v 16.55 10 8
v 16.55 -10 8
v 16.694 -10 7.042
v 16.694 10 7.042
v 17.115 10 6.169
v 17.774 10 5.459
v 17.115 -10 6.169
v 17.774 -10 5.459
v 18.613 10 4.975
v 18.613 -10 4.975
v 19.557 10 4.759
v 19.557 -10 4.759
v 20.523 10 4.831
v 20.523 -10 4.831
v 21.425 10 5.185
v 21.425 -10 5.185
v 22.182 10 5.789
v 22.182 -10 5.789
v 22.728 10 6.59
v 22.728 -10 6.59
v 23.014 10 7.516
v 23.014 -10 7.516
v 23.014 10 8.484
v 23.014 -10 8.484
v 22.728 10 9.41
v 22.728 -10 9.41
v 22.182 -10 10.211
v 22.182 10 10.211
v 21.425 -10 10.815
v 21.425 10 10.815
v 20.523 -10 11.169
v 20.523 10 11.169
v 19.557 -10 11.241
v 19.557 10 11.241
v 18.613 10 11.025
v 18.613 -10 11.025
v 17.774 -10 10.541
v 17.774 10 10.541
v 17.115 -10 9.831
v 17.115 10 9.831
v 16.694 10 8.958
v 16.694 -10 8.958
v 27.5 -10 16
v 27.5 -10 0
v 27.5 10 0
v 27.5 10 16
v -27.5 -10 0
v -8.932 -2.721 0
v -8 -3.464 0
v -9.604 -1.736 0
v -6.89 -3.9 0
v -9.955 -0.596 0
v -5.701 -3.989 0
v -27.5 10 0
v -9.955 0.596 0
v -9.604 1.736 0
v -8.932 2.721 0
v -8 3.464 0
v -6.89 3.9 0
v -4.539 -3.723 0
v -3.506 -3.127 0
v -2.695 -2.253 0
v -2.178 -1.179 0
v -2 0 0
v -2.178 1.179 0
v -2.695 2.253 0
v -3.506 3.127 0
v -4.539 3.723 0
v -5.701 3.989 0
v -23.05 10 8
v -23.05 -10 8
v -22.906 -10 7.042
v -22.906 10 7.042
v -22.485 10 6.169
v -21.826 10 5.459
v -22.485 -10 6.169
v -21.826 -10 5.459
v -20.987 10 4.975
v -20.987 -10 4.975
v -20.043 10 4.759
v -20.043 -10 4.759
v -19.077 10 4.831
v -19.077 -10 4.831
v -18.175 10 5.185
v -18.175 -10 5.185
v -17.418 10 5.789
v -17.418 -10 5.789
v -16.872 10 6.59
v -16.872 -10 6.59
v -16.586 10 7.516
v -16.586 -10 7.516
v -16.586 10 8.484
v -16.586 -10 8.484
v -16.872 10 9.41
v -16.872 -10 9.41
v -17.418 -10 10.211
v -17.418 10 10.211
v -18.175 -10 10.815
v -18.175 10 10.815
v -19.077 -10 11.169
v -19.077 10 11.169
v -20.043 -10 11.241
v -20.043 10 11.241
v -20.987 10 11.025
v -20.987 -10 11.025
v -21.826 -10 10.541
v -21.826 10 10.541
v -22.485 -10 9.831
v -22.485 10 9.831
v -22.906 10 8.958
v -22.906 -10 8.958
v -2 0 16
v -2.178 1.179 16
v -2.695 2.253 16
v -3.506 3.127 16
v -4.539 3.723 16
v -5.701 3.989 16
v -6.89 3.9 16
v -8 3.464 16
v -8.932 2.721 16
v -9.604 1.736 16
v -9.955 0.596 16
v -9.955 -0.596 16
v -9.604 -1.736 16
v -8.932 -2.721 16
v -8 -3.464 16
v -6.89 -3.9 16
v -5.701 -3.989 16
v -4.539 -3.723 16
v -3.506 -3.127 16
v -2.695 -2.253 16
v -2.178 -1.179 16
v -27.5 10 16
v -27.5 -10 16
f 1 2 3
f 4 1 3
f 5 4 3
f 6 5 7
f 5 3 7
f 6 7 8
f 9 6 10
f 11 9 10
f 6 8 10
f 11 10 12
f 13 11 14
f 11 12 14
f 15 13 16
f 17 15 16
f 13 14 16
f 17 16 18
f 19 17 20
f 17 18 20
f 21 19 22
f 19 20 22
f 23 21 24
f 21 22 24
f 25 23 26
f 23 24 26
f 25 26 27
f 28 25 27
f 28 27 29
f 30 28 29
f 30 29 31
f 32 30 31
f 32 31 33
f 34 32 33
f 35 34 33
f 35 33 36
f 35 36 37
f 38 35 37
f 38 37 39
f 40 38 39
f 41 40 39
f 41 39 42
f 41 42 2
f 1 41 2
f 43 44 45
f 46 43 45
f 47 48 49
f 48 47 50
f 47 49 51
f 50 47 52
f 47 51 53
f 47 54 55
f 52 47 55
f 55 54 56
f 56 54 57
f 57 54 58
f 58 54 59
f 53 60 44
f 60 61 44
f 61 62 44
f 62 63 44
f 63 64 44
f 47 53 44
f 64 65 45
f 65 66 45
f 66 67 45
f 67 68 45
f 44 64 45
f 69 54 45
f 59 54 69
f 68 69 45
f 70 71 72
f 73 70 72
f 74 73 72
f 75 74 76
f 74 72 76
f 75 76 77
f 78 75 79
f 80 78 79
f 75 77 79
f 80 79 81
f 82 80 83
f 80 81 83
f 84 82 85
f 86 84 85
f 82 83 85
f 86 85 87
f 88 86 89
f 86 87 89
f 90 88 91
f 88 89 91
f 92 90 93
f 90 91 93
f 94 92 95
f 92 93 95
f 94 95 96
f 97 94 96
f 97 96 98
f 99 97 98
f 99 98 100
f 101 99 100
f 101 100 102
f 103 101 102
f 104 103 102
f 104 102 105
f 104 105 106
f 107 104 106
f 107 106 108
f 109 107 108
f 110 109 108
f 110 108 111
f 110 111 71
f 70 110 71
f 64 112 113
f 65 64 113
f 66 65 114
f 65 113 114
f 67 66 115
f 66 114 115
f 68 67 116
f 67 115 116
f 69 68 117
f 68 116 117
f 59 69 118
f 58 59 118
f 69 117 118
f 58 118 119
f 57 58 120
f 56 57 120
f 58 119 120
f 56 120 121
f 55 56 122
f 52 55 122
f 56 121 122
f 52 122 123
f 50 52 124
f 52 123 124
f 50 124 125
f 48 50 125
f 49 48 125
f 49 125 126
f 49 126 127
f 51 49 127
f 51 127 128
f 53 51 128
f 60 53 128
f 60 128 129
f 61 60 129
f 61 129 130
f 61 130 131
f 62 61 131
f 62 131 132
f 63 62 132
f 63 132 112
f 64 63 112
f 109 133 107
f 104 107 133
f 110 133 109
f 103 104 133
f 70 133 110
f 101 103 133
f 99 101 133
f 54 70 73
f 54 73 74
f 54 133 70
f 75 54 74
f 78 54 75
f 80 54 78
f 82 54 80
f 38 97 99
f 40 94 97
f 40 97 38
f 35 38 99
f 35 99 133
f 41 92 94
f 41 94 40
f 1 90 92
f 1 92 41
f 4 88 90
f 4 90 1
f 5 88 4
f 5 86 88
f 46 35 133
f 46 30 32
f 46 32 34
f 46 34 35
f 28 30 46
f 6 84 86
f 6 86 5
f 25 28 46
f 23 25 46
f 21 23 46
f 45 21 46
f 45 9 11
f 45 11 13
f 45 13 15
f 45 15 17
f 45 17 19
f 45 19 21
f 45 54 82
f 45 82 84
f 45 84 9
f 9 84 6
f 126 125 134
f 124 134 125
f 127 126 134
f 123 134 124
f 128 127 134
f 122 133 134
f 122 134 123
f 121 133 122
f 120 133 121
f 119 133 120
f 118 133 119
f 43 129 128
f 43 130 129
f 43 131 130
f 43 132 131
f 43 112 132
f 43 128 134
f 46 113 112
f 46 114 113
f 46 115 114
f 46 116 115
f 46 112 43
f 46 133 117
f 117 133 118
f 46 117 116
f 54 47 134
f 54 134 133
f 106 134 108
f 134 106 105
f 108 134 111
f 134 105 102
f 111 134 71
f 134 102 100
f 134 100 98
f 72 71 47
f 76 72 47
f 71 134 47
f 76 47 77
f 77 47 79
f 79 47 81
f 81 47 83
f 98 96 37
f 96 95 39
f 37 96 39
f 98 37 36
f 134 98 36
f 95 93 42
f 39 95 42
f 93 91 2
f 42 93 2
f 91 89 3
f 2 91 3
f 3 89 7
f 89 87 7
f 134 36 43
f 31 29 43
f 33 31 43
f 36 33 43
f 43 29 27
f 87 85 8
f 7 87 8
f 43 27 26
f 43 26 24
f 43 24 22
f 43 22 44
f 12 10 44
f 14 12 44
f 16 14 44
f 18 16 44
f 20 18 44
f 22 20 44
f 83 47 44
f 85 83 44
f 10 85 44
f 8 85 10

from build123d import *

# Parameters (mm, degrees)
SKETCH_1_W              = 55
SKETCH_1_H              = 20
EXTRUDE_1_DEPTH         = 16
SKETCH_2_R              = 4
CUT_EXTRUDE_1_DEPTH     = 18
HOLE_WIZARD_6_5_6_5_1_D = 6.5


with BuildPart() as part:
    # Эскиз1 → Бобышка-Вытянуть1 (new body)
    with BuildSketch(Plane.XY):
        Rectangle(SKETCH_1_W, SKETCH_1_H)
    extrude(amount=EXTRUDE_1_DEPTH)

    # Эскиз2 → Вырез-Вытянуть1 (cut)
    with BuildSketch(Plane.XY.offset(16)):
        with Locations((-6, 0)):
            Circle(SKETCH_2_R)
    extrude(amount=-CUT_EXTRUDE_1_DEPTH, mode=Mode.SUBTRACT)

    # Диаметр отверстия Ø6.5 (6.5)1 (through all)
    with Locations(Plane(origin=(0, 10, 0), x_dir=(1, 0, 0), z_dir=(0, 1, 0))):
        with Locations((19.8, -8), (-19.8, -8)):
            Hole(HOLE_WIZARD_6_5_6_5_1_D / 2)


solid = part.part
